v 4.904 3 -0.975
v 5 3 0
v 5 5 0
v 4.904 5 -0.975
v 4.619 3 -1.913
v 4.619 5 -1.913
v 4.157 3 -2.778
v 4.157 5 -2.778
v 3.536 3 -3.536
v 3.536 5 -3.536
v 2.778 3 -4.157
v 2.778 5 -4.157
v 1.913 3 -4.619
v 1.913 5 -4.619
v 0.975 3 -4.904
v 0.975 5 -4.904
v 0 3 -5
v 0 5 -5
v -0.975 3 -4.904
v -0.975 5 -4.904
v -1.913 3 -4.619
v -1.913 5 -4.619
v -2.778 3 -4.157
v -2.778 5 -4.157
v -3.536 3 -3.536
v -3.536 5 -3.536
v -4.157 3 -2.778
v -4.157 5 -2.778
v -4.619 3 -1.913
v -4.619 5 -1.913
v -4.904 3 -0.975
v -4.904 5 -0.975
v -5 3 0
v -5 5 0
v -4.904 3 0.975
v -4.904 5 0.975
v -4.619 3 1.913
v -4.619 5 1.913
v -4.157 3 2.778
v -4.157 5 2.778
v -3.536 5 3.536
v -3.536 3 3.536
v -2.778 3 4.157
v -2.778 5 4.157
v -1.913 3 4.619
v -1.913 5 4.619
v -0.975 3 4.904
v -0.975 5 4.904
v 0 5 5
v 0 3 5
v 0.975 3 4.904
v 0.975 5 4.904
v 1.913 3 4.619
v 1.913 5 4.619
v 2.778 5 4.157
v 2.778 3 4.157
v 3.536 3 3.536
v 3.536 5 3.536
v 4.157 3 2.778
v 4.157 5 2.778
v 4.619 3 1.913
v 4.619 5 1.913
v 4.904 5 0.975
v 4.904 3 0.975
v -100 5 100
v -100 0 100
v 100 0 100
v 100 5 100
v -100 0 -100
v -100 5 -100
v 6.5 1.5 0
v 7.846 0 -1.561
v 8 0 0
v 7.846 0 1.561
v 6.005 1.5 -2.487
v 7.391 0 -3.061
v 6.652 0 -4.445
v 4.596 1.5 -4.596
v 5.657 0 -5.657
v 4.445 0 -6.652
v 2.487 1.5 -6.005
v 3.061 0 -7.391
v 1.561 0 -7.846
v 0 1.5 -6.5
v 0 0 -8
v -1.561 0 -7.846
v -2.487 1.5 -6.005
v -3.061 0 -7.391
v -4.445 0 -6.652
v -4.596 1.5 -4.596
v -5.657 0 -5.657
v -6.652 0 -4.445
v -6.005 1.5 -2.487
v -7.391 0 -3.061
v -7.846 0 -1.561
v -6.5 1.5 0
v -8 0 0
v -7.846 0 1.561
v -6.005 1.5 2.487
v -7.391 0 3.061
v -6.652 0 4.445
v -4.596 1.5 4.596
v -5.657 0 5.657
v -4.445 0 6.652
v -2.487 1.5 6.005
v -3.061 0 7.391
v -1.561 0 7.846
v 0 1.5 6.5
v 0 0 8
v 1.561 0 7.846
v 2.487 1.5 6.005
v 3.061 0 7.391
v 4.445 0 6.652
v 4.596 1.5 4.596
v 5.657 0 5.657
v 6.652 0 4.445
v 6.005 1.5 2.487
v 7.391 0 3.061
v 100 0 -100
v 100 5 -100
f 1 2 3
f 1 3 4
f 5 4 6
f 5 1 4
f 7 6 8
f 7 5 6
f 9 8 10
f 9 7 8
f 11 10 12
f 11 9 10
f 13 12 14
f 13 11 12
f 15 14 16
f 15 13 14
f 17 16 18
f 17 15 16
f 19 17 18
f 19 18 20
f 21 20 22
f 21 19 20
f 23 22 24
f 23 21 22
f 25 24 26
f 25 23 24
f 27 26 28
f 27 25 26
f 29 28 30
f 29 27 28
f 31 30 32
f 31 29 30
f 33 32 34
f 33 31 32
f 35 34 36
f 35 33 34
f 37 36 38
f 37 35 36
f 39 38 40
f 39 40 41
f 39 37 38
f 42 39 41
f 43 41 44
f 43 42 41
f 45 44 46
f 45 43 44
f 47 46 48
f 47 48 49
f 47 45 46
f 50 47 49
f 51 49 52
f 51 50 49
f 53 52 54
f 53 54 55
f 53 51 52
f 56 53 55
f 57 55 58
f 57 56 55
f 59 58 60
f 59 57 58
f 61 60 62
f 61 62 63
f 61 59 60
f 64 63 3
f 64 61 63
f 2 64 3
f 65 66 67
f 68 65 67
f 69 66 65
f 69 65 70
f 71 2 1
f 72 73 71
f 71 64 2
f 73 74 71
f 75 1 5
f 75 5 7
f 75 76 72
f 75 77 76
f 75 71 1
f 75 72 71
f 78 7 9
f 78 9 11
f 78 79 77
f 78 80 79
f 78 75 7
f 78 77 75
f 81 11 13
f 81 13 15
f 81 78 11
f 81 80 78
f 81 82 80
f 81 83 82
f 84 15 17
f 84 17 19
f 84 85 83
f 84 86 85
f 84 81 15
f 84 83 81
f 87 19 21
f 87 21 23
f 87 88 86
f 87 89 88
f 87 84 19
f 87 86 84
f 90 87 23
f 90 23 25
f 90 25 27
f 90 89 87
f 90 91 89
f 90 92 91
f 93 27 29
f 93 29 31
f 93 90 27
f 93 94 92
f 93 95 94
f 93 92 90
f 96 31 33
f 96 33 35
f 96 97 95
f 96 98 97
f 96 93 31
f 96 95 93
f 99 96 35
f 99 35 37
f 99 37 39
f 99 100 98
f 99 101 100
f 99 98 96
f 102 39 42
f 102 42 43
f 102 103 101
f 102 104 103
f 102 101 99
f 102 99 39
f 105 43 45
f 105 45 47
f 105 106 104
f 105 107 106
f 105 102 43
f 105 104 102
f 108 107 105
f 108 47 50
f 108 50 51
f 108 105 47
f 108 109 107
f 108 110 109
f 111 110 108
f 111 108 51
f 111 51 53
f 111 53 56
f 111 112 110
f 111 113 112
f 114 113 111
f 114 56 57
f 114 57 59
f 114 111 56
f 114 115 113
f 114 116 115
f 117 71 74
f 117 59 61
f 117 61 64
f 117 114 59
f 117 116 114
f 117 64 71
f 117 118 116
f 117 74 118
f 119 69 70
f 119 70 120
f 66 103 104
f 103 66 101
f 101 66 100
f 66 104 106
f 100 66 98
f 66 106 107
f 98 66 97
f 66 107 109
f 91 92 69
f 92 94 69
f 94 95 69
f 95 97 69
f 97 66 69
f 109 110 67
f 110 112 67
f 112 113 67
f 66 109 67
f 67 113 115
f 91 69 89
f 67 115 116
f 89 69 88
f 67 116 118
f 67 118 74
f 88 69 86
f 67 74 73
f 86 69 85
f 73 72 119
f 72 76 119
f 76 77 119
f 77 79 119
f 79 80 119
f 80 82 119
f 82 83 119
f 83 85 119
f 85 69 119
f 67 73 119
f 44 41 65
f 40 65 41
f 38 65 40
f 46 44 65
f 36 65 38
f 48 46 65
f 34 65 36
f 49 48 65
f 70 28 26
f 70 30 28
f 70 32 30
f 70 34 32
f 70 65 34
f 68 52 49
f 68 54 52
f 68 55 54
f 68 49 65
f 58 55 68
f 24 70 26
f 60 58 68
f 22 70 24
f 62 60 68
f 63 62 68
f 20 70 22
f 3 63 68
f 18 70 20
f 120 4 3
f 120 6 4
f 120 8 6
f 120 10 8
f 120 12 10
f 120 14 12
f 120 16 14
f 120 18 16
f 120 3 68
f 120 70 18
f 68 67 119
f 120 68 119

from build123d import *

# Parameters (mm, degrees)
SKETCH_1_W      = 200
SKETCH_1_H      = 200
SKETCH_1_R      = 5
EXTRUDE_1_DEPTH = 5
CHAMFER_1_SIZE  = 3


with BuildPart() as part:
    # Эскиз1 → Бобышка-Вытянуть1 (new body)
    with BuildSketch(Plane(origin=(0, 0, 0), x_dir=(1, 0, 0), z_dir=(0, 1, 0))):
        Rectangle(SKETCH_1_W, SKETCH_1_H)
        Circle(SKETCH_1_R, mode=Mode.SUBTRACT)
    extrude(amount=EXTRUDE_1_DEPTH)

    # Фаска1
    chamfer_1_edges = [part.edges().sort_by_distance(p)[0] for p in [
        (-5, 0, 0),
    ]]
    chamfer(chamfer_1_edges, length=CHAMFER_1_SIZE)


solid = part.part
